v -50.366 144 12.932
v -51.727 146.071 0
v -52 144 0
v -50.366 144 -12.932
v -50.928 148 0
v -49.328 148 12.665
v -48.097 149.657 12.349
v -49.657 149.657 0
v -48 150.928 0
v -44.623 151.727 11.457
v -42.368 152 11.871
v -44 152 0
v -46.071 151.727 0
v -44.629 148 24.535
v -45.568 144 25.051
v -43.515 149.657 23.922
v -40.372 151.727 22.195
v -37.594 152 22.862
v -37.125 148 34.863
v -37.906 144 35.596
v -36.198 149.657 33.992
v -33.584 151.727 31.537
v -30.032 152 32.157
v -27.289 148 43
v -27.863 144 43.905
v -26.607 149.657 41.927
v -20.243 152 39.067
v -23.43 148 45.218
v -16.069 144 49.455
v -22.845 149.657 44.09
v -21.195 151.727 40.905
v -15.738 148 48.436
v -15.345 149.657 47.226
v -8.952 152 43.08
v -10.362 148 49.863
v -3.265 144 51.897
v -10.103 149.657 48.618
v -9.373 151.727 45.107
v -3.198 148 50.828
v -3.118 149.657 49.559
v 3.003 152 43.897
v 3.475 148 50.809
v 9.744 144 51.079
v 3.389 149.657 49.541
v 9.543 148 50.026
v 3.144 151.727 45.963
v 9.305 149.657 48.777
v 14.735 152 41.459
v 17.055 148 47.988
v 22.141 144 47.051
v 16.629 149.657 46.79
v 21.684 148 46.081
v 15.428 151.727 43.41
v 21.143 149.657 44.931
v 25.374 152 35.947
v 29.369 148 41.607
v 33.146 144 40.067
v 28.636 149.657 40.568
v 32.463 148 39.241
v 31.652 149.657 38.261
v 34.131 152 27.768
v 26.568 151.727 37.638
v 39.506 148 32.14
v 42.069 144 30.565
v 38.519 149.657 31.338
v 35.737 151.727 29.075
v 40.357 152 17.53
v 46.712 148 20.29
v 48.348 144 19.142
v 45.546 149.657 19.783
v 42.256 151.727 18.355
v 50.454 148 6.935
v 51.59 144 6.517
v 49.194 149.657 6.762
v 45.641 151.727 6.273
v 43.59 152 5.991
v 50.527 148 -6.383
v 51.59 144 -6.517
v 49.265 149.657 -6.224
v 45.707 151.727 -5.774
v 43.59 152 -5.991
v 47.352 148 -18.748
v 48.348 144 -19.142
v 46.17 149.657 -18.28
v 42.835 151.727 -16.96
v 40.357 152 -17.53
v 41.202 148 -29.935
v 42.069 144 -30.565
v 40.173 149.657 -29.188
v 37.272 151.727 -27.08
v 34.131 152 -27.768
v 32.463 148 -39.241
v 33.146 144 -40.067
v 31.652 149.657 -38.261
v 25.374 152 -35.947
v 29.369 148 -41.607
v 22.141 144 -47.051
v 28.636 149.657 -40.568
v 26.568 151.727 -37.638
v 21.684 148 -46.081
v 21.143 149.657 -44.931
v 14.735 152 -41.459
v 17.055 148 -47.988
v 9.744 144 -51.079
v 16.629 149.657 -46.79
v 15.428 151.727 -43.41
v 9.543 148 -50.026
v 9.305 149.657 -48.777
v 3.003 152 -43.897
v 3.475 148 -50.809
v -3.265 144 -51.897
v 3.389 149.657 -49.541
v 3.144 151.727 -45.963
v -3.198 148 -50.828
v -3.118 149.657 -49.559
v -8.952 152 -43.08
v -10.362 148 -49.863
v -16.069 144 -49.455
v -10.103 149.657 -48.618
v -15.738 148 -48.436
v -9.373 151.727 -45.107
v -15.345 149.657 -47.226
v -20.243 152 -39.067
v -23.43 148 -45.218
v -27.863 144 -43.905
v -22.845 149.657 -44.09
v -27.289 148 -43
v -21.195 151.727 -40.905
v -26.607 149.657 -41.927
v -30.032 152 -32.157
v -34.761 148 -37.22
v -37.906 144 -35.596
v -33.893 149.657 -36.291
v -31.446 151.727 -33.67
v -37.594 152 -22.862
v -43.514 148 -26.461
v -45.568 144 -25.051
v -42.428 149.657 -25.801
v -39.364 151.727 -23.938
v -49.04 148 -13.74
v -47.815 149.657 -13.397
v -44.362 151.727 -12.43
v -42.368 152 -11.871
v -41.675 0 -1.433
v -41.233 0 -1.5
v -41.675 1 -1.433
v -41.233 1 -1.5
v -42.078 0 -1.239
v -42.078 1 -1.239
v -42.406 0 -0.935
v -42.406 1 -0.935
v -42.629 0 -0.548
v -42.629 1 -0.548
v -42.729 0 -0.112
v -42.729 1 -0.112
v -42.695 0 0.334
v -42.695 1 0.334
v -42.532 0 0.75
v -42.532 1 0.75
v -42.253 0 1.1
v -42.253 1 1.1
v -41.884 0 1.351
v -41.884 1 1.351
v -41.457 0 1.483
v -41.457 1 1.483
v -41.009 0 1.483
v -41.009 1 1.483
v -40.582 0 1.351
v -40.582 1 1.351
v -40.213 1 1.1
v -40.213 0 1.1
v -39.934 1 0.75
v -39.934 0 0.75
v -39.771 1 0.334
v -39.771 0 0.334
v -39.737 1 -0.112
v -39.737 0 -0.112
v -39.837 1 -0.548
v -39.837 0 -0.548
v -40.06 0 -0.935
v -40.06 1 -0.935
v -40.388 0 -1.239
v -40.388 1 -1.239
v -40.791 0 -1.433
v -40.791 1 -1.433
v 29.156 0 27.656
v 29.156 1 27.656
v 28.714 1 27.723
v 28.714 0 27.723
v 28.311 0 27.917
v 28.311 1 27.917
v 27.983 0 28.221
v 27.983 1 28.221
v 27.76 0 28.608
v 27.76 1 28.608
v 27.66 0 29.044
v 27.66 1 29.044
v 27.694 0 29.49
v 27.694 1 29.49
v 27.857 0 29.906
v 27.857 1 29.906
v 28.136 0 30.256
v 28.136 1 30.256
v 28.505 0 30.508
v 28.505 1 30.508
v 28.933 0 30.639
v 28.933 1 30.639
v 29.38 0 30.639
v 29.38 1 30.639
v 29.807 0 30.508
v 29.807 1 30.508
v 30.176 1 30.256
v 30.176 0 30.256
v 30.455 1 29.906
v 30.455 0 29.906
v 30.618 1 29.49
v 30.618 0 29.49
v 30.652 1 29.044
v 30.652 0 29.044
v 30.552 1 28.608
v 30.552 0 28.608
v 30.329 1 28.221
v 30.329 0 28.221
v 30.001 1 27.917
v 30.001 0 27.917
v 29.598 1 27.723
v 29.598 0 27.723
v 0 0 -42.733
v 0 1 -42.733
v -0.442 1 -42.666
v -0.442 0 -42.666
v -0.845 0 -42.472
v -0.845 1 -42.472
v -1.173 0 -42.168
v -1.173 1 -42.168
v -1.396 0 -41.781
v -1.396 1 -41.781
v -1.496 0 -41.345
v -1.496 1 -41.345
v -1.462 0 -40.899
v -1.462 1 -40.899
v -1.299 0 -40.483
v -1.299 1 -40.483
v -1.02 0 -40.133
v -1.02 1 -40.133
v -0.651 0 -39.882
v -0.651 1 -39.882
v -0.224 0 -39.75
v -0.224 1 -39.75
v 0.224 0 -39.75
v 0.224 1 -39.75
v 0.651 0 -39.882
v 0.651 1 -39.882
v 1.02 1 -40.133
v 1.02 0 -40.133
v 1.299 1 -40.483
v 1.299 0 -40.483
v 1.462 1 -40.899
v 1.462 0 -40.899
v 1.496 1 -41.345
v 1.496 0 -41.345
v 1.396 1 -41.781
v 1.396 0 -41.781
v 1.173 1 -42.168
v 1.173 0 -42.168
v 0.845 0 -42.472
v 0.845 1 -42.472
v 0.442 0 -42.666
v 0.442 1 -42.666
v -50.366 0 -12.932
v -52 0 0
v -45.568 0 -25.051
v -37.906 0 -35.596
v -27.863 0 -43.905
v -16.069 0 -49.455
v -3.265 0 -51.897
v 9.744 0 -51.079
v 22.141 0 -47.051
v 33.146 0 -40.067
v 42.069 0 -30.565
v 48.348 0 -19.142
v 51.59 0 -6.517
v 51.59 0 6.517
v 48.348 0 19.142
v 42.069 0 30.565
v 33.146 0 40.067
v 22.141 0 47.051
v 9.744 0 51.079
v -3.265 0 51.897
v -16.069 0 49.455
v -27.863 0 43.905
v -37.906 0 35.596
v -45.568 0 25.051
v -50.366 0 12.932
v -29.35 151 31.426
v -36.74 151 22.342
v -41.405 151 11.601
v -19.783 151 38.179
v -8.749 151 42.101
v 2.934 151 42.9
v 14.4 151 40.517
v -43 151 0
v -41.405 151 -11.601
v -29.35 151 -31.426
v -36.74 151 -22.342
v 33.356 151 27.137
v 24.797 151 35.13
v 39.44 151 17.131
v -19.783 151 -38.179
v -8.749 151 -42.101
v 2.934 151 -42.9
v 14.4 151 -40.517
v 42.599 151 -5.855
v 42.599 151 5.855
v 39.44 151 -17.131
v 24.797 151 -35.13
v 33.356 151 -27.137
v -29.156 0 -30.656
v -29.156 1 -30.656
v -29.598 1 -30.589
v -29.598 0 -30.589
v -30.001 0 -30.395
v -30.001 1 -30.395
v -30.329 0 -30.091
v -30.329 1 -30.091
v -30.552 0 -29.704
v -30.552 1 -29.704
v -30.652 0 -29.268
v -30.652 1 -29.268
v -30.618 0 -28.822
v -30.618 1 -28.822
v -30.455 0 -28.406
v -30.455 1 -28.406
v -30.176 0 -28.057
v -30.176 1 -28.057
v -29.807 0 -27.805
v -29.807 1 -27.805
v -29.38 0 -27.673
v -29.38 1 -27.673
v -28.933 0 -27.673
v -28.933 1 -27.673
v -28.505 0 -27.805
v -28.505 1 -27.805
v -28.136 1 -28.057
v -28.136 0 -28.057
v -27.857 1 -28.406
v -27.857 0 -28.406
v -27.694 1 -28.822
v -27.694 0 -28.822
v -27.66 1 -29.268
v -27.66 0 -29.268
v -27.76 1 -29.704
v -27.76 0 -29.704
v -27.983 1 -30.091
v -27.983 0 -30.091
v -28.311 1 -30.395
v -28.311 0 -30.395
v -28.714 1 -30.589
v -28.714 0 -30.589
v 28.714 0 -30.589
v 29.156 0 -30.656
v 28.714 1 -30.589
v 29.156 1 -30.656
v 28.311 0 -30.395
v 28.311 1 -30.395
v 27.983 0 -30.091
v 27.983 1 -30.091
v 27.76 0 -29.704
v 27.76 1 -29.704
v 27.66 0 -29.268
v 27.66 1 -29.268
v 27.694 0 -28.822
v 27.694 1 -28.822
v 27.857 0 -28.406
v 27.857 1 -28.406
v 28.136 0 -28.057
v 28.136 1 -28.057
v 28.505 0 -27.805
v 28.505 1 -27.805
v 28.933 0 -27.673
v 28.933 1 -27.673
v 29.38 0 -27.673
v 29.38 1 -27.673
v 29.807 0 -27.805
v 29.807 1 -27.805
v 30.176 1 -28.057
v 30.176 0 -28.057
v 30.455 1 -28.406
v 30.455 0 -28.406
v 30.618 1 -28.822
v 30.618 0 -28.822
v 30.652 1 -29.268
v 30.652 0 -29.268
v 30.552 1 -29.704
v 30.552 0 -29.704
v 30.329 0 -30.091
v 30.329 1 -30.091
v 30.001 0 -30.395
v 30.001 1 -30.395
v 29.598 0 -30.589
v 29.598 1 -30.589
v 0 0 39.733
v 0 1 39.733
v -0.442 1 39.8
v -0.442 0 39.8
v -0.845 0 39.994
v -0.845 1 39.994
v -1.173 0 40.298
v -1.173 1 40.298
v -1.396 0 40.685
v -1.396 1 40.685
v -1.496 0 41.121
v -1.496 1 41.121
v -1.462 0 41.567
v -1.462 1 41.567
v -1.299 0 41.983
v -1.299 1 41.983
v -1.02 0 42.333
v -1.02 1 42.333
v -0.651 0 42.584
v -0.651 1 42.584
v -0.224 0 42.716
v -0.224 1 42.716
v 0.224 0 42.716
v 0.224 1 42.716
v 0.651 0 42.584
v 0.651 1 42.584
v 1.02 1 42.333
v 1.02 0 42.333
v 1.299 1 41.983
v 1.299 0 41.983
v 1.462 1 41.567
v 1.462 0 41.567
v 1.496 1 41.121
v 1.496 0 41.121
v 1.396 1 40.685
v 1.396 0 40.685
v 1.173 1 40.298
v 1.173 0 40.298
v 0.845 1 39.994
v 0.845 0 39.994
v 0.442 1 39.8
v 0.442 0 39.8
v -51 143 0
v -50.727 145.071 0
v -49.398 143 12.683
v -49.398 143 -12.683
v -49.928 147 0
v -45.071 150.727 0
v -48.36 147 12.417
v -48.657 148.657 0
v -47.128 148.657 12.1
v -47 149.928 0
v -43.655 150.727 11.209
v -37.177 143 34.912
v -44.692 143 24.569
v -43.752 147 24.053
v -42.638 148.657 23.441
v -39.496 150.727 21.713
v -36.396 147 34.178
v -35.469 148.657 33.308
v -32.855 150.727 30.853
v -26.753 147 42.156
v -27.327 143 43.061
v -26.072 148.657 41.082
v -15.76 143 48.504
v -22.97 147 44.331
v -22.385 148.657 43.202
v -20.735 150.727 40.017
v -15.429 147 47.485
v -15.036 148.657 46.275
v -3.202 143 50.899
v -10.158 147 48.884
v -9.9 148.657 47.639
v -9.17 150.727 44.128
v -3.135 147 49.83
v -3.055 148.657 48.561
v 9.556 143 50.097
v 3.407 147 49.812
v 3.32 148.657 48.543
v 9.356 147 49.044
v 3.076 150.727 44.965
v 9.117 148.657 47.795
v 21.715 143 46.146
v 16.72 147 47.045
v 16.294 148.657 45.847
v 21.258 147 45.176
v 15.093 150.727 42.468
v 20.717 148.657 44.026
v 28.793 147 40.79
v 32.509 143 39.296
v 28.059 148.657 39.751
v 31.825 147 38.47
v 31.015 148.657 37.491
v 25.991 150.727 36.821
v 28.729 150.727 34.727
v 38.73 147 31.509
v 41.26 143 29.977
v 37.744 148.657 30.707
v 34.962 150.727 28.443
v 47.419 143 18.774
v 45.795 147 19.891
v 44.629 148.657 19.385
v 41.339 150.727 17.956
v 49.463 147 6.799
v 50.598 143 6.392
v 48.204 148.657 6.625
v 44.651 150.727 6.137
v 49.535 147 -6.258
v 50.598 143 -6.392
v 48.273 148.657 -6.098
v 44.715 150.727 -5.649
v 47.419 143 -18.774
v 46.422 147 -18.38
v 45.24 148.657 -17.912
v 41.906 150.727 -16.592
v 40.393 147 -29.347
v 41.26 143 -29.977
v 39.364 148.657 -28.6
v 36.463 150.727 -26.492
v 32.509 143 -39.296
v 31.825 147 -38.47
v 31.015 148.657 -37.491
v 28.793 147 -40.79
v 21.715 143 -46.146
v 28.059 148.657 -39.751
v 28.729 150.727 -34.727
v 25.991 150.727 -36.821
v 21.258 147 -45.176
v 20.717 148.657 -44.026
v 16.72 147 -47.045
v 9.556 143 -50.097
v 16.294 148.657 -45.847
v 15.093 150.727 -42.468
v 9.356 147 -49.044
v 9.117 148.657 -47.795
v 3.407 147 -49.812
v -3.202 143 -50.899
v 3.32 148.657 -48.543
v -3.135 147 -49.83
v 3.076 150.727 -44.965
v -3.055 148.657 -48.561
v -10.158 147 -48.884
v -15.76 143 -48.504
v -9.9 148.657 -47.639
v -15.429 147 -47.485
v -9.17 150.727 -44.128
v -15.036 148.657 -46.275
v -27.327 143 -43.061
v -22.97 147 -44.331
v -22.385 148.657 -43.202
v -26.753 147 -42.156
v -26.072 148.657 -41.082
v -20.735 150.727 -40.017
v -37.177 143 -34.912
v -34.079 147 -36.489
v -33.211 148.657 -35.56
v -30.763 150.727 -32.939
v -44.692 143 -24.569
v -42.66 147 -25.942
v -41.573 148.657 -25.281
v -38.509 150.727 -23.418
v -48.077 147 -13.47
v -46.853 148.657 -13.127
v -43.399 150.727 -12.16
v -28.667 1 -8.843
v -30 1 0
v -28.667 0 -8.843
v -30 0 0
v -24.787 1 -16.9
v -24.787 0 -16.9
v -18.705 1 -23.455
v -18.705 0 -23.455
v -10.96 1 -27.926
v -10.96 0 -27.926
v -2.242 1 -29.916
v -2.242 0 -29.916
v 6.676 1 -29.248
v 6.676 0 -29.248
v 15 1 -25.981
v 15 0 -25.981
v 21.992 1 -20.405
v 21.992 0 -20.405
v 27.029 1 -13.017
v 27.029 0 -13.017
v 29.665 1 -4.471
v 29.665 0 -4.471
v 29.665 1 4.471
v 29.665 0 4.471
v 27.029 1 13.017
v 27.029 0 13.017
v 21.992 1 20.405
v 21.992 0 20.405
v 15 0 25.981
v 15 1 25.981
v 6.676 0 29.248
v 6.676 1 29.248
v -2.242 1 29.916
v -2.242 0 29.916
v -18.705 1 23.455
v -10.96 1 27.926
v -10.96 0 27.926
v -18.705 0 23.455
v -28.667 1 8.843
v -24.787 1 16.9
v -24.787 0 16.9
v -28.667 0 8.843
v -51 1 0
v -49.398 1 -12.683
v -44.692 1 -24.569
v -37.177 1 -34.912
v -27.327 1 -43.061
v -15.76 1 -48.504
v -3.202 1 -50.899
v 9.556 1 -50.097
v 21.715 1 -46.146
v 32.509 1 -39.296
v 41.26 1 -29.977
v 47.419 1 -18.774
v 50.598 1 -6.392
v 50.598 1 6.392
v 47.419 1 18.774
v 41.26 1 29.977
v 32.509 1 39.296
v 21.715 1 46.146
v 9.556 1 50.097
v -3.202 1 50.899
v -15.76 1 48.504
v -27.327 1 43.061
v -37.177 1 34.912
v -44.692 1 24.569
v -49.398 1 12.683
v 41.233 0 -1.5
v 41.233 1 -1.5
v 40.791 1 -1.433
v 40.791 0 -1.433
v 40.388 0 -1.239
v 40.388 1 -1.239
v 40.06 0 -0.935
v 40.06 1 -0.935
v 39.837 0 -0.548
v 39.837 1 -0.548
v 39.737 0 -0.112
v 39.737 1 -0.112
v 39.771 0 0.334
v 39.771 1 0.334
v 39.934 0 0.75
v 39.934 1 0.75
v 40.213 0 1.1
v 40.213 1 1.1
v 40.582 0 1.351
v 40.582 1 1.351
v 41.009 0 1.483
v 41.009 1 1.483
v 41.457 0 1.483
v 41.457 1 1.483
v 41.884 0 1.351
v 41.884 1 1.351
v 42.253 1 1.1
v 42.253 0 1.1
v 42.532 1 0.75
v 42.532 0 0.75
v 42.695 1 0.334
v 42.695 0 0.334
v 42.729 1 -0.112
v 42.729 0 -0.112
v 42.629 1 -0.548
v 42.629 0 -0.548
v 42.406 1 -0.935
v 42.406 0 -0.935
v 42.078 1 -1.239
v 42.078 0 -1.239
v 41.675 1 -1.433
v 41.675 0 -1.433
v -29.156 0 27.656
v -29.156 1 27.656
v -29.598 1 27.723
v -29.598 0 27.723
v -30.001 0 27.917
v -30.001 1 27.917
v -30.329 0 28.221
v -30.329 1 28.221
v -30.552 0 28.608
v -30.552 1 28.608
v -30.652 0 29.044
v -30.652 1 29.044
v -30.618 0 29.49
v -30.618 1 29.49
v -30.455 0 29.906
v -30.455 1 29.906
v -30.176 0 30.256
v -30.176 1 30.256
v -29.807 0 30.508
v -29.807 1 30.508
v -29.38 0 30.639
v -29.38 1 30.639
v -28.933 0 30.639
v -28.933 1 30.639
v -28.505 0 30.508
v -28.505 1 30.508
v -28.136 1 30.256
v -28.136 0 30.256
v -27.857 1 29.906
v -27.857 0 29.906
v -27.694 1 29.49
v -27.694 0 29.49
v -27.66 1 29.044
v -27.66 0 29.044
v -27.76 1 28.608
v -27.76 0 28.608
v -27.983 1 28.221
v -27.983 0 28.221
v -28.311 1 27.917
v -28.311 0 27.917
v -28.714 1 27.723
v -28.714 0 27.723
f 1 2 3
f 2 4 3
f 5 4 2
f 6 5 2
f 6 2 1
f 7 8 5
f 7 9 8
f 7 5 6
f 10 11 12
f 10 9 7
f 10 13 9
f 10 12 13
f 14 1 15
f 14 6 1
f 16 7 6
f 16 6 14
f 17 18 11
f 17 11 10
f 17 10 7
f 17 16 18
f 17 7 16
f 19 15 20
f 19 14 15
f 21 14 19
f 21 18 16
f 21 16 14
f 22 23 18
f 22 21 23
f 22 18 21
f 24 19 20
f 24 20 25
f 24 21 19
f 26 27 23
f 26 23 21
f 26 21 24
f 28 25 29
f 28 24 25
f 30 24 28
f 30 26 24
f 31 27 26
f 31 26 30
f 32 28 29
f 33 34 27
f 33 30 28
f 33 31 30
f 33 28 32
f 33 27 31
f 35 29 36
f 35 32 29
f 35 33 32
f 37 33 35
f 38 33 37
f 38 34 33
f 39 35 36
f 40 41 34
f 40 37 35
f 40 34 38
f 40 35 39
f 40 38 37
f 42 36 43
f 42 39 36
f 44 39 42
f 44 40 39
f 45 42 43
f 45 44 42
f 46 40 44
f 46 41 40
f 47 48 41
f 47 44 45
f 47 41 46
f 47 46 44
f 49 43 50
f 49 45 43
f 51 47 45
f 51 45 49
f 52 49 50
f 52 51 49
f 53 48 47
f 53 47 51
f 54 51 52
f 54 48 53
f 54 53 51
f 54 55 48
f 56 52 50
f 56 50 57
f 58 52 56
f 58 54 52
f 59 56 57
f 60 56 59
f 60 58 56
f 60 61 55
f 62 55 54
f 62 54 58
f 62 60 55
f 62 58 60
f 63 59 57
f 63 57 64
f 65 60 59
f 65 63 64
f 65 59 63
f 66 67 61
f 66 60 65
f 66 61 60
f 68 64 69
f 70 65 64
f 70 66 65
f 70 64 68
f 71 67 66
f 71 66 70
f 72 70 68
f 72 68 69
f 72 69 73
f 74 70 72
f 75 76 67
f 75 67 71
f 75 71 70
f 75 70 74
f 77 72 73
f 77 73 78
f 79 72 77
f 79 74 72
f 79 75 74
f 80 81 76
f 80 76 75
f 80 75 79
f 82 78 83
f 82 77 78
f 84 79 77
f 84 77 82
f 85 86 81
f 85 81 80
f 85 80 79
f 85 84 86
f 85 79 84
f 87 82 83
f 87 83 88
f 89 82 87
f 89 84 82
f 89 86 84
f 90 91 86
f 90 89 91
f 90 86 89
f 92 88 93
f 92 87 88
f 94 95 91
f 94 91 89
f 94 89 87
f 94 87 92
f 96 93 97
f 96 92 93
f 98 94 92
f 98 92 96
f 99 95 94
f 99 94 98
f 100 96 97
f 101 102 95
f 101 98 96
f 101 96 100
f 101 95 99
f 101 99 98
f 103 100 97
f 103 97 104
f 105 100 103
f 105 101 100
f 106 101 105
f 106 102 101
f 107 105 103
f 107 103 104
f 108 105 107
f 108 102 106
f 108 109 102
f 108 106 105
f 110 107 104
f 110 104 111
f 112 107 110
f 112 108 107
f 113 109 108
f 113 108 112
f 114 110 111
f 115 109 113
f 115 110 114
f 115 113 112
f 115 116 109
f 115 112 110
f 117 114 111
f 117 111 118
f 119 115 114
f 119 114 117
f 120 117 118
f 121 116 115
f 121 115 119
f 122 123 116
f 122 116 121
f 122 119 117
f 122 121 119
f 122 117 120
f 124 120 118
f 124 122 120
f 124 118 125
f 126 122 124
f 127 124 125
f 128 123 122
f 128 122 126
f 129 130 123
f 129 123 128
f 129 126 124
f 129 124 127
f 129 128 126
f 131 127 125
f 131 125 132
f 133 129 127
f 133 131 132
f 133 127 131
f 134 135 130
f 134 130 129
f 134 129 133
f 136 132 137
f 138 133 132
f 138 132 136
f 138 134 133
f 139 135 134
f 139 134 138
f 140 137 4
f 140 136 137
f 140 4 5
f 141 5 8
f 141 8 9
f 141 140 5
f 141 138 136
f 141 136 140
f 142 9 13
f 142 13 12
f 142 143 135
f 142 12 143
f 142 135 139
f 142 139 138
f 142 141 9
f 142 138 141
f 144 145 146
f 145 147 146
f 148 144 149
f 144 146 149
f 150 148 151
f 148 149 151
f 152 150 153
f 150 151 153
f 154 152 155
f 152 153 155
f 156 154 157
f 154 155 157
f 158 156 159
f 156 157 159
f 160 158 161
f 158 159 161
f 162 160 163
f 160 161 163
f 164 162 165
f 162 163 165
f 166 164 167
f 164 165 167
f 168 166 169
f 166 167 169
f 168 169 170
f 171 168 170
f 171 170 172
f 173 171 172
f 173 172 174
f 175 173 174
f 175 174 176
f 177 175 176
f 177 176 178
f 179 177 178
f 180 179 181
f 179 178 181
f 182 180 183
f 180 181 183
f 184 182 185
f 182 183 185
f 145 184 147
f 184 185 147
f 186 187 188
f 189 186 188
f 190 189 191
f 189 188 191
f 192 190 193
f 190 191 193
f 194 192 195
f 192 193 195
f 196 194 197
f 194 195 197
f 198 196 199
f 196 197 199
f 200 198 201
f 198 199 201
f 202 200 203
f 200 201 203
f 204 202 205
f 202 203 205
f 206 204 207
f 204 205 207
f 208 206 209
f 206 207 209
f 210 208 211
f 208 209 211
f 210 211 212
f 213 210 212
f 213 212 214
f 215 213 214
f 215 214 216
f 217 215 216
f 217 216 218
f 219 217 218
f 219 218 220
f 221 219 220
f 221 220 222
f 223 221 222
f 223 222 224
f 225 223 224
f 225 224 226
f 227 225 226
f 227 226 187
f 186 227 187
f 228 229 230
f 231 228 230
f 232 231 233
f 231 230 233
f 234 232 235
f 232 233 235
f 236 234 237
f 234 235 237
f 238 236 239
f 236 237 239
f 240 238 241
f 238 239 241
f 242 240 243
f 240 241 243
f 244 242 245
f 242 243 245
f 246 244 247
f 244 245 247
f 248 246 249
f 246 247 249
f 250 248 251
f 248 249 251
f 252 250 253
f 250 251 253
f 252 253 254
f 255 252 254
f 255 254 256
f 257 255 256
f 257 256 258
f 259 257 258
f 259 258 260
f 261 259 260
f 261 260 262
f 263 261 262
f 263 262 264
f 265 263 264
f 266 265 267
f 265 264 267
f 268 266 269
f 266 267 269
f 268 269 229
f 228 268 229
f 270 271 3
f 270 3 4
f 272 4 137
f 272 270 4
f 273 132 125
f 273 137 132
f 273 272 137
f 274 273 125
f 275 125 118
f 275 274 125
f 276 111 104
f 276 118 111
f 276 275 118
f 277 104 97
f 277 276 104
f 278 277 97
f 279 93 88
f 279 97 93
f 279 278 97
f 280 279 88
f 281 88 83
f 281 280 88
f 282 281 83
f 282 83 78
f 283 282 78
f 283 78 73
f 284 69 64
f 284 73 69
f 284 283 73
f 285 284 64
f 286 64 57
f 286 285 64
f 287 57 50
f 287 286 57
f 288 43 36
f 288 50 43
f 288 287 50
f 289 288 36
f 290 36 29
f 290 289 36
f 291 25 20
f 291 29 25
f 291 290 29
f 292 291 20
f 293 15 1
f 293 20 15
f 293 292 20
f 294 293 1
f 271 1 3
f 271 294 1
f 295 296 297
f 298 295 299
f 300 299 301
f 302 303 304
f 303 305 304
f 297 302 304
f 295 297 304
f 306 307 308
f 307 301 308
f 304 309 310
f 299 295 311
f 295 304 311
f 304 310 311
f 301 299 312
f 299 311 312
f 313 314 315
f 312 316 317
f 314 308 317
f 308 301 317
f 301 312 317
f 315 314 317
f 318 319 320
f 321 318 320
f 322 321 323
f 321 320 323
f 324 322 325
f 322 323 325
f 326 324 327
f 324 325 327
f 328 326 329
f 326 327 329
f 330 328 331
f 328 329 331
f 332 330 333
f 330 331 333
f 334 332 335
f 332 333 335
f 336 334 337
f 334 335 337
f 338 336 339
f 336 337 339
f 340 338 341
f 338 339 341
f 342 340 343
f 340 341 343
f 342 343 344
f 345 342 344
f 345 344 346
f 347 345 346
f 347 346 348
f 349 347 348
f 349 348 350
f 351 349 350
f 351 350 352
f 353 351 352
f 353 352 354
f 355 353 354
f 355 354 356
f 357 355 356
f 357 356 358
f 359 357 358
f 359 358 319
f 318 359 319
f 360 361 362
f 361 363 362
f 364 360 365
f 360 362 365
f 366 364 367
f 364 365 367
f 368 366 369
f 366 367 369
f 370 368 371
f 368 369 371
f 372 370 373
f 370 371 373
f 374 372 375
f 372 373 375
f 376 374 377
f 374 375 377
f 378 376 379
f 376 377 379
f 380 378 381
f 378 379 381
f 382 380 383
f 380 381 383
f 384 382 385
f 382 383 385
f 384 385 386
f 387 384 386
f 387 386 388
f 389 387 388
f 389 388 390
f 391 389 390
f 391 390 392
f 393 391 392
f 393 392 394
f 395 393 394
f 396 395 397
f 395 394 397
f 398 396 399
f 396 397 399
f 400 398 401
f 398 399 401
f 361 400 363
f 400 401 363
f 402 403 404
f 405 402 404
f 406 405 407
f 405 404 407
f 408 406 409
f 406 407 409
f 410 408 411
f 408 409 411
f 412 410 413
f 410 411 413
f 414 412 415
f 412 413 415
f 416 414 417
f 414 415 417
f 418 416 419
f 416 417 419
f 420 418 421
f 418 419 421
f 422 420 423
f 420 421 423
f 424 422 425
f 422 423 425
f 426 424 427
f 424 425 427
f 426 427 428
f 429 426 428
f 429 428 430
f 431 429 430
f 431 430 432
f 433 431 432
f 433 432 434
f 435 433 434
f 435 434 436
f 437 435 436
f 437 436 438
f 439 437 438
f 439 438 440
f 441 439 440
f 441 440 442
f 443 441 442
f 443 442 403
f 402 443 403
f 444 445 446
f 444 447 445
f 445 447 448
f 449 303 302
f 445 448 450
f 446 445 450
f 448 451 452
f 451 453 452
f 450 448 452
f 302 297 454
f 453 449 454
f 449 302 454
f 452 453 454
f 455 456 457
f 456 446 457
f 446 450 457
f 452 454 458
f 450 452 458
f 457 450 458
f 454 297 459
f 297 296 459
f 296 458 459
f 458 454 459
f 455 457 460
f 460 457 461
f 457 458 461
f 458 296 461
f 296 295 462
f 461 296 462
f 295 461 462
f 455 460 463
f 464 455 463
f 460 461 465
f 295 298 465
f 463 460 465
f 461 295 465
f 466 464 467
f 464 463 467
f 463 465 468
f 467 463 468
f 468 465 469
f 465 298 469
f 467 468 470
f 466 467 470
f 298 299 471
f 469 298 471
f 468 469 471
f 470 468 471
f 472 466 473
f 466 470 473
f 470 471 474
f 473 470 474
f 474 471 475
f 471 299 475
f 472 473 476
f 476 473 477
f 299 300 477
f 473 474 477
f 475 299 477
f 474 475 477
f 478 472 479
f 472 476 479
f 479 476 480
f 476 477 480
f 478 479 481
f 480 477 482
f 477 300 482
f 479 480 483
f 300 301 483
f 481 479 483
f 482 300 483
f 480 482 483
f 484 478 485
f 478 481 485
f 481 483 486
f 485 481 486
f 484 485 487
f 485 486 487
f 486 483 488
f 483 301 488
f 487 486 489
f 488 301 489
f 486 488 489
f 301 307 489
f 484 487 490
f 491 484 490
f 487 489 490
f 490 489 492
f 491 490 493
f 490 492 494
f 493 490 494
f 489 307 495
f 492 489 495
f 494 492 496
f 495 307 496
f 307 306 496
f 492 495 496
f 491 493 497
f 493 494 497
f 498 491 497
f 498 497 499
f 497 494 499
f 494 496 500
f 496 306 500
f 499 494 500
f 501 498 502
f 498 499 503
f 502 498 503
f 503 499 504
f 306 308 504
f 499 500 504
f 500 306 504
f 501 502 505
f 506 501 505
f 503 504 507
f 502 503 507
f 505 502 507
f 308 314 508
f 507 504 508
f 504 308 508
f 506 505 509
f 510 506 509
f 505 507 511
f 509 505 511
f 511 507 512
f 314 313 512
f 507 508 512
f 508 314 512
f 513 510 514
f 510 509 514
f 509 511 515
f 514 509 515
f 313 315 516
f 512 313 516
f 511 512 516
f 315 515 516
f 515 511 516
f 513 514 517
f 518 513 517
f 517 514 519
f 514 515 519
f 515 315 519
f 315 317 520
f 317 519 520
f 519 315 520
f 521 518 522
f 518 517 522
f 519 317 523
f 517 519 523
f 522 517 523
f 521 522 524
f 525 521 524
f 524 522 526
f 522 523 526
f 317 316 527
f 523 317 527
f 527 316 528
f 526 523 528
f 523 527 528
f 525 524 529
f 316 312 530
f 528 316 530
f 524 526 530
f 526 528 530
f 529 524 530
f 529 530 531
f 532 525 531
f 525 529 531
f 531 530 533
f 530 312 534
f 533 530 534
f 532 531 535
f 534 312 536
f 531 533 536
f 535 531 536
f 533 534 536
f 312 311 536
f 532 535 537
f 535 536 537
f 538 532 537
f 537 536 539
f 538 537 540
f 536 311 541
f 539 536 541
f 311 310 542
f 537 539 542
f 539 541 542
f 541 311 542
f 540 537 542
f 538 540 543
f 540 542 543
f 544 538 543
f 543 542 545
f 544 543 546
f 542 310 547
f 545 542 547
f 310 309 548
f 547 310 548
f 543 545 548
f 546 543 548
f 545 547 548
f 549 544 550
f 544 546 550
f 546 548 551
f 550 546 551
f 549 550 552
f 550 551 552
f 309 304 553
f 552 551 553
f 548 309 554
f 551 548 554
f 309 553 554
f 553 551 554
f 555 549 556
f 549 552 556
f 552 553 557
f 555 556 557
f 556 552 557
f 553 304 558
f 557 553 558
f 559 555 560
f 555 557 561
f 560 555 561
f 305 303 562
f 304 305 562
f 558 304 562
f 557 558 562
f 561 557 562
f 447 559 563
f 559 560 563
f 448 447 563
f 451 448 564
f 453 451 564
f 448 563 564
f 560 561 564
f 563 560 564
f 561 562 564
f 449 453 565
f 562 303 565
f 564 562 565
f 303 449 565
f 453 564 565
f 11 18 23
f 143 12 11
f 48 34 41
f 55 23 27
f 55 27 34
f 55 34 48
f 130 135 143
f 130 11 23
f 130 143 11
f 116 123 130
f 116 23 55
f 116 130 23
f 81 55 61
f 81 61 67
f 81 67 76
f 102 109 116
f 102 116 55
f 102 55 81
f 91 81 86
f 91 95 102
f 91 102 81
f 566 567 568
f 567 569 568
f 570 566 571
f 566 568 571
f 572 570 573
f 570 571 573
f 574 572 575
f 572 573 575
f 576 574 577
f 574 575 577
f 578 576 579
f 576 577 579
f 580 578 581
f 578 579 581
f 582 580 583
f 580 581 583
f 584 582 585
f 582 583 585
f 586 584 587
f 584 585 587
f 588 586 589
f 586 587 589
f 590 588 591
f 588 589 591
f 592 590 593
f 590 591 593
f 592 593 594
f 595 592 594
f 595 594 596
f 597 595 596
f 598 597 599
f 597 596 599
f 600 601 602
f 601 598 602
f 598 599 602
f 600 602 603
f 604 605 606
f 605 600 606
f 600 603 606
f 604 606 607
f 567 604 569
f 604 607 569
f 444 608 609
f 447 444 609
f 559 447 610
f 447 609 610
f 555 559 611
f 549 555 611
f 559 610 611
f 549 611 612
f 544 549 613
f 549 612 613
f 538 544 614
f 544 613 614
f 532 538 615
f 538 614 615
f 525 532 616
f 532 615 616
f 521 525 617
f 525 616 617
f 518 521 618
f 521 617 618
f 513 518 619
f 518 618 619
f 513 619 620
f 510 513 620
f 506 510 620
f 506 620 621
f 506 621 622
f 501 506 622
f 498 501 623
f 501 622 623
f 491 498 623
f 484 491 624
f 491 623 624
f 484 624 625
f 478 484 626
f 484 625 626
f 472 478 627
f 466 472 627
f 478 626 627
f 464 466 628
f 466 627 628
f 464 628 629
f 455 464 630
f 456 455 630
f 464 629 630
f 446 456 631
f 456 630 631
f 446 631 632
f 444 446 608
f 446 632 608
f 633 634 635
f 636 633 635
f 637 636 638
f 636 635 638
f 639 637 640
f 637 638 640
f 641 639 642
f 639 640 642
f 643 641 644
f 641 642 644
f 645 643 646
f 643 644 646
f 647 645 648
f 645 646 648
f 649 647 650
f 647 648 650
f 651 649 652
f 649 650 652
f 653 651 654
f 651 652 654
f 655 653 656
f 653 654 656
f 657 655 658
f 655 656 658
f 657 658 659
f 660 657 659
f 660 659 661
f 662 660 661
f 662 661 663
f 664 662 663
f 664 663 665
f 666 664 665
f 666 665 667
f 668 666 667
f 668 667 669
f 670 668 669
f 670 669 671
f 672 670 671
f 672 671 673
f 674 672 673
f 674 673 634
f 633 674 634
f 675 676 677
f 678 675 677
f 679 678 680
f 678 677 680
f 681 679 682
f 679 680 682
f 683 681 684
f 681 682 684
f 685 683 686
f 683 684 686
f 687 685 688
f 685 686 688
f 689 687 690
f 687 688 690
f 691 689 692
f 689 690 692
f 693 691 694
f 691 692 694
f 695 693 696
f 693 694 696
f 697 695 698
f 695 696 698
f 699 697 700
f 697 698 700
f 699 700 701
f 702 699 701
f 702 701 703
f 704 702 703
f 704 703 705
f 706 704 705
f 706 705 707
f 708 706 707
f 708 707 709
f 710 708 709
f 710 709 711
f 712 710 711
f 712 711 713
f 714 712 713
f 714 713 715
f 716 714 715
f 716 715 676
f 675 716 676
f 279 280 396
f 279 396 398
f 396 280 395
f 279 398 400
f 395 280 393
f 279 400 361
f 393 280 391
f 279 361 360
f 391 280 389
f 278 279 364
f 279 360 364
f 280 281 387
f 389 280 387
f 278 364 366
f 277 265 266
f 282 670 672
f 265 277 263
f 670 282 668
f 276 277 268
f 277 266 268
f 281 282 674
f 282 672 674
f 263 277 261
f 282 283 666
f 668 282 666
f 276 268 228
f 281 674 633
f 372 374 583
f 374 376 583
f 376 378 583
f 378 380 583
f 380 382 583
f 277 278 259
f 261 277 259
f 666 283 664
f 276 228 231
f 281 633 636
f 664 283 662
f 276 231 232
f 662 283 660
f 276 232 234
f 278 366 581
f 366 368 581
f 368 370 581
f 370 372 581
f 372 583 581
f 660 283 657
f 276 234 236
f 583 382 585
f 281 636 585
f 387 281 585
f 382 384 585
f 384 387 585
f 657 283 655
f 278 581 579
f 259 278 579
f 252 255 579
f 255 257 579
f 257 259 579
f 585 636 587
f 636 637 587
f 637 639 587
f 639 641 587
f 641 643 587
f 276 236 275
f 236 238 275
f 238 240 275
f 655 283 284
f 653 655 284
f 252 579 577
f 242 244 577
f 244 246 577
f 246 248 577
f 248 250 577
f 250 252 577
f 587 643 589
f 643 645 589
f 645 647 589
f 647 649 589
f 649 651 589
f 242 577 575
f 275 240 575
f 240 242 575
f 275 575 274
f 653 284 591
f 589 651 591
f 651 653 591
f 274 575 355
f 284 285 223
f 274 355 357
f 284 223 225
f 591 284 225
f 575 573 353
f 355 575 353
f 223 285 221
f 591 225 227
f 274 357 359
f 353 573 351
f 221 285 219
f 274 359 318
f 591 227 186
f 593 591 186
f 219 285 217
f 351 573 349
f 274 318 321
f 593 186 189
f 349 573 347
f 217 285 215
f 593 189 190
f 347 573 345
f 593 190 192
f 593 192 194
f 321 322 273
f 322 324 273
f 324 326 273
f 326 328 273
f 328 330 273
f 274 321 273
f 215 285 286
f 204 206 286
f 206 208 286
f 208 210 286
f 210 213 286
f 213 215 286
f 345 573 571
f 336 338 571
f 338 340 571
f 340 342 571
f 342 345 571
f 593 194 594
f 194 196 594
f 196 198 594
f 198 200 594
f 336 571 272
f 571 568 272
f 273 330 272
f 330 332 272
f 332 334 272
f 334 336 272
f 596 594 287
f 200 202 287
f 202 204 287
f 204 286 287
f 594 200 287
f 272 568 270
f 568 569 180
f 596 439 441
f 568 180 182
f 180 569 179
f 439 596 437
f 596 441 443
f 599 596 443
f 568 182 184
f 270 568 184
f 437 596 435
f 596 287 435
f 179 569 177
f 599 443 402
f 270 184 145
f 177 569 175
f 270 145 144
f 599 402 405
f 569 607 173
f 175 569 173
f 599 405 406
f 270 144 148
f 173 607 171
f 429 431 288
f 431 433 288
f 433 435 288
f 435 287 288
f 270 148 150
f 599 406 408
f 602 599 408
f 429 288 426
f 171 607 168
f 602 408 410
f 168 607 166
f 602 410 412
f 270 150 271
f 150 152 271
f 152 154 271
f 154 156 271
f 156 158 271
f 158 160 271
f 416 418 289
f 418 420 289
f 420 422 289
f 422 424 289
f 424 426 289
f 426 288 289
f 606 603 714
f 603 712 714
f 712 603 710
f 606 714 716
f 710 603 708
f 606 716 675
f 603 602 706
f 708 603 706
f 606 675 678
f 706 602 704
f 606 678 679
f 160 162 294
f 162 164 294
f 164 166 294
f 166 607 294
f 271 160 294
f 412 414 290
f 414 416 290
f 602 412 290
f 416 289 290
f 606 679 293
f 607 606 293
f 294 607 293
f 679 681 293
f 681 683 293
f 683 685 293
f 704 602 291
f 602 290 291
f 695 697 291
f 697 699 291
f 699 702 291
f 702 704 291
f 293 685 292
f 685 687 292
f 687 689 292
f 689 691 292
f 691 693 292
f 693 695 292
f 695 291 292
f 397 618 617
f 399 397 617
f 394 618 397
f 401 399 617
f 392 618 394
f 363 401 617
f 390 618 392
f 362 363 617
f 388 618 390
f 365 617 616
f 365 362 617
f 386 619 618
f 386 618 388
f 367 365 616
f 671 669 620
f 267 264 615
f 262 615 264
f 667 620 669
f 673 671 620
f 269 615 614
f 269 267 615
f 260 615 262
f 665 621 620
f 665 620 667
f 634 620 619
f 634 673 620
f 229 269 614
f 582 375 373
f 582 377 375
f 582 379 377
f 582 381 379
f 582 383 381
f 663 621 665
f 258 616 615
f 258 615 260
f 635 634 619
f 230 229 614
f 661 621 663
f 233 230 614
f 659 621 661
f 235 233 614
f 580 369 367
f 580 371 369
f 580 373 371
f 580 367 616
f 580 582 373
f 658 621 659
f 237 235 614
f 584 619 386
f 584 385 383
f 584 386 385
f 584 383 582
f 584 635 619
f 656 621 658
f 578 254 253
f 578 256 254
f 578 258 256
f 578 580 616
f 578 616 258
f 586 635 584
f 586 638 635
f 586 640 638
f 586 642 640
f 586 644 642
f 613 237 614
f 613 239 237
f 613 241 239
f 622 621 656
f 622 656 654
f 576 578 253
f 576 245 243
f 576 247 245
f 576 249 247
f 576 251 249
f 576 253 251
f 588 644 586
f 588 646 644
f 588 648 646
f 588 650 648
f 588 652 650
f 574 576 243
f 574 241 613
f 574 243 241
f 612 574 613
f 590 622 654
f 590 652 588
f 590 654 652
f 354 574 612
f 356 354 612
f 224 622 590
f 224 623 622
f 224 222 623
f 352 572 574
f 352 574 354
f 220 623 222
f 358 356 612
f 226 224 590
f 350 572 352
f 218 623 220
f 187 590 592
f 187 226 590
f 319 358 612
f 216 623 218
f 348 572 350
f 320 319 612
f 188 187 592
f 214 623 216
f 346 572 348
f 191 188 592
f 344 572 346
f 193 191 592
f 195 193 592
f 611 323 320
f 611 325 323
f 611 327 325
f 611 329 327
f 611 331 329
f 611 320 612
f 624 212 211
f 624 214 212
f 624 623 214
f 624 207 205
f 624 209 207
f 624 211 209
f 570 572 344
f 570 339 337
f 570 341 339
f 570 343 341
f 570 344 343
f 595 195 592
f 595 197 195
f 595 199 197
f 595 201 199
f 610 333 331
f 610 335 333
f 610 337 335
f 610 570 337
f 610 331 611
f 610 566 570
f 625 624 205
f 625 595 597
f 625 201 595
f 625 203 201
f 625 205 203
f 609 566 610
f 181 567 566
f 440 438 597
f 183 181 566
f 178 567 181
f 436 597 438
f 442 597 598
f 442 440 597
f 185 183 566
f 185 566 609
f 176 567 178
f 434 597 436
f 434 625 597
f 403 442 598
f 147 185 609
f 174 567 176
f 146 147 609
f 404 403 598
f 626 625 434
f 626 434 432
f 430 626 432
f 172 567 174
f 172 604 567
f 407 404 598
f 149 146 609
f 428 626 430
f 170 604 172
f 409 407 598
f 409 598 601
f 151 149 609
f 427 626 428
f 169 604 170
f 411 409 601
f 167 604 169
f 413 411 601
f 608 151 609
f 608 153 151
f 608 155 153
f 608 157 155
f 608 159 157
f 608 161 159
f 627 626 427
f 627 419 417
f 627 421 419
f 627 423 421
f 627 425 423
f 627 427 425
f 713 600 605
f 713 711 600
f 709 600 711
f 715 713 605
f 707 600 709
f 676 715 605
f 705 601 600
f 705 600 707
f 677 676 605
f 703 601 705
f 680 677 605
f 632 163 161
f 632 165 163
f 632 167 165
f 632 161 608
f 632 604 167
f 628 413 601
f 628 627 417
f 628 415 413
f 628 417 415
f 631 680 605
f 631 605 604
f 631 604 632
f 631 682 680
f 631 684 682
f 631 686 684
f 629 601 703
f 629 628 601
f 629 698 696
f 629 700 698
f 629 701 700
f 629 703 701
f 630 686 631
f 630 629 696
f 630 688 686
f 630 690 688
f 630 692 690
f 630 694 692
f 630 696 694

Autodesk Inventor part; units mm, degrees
ref_plane "YZ Plane" through (0, 0, 0) normal (1, 0, 0) x (0, 1, 0)
ref_plane "XZ Plane" through (0, 0, 0) normal (0, 1, 0) x (-1, 0, 0)
ref_plane "XY Plane" through (0, 0, 0) normal (0, 0, 1) x (1, 0, 0)
sketch "Boceto1" plane through (0, 0, 0) normal (0, 1, 0) x (-1, 0, 0)
  circle A0 centre (0, 0) radius 51
  circle A1 centre (0, 0) radius 30
  circle A2 centre (0, 0) radius 52
  point P0 (41.233, 0)
  point P1 (29.1561, 29.1561)
  point P2 (0, 41.233)
  point P3 (-29.1561, 29.1561)
  point P4 (-41.233, 0)
  point P5 (-29.1561, -29.1561)
  point P6 (0, -41.233)
  point P7 (29.1561, -29.1561)
  dimension "d0" = 102
  dimension "d1" = 60
  dimension "d2" = 41.233
  dimension "d3" = 1
  dimension "d8" = 360
extrude "Extrusión1" add sketch "Boceto1" along normal blind 1 contours A0
extrude "Extrusión2" add sketch "Boceto1" along normal blind 152 contours A0 | A2
sketch "Boceto3" plane through (0, 152, 0) normal (0, 1, 0) x (1, 0, 0)
  circle A0 centre (0, 0) radius 30 projected
extrude "Extrusión4" add sketch "Boceto3" against normal blind 151
shell "Vaciado1" thickness 1 removed faces 1 at (-8.8546, 1, 4.6472)
fillet "Empalme1" radius 8 2 edges at (51, 151, 0) (52, 152, 0)
hole "Hole1" at (-41.233, 0, 0) at (-29.1561, 0, 29.1561) at (0, 0, 41.233) at (29.1561, 0, 29.1561) at (41.233, 0, 0) at (29.1561, 0, -29.1561) at (0, 0, -41.233) at (-29.1561, 0, -29.1561) direction (0, 1, 0) diameter 3 depth 8 tip angle 118
properties part number "Capa" material "Caucho, Silicona"
